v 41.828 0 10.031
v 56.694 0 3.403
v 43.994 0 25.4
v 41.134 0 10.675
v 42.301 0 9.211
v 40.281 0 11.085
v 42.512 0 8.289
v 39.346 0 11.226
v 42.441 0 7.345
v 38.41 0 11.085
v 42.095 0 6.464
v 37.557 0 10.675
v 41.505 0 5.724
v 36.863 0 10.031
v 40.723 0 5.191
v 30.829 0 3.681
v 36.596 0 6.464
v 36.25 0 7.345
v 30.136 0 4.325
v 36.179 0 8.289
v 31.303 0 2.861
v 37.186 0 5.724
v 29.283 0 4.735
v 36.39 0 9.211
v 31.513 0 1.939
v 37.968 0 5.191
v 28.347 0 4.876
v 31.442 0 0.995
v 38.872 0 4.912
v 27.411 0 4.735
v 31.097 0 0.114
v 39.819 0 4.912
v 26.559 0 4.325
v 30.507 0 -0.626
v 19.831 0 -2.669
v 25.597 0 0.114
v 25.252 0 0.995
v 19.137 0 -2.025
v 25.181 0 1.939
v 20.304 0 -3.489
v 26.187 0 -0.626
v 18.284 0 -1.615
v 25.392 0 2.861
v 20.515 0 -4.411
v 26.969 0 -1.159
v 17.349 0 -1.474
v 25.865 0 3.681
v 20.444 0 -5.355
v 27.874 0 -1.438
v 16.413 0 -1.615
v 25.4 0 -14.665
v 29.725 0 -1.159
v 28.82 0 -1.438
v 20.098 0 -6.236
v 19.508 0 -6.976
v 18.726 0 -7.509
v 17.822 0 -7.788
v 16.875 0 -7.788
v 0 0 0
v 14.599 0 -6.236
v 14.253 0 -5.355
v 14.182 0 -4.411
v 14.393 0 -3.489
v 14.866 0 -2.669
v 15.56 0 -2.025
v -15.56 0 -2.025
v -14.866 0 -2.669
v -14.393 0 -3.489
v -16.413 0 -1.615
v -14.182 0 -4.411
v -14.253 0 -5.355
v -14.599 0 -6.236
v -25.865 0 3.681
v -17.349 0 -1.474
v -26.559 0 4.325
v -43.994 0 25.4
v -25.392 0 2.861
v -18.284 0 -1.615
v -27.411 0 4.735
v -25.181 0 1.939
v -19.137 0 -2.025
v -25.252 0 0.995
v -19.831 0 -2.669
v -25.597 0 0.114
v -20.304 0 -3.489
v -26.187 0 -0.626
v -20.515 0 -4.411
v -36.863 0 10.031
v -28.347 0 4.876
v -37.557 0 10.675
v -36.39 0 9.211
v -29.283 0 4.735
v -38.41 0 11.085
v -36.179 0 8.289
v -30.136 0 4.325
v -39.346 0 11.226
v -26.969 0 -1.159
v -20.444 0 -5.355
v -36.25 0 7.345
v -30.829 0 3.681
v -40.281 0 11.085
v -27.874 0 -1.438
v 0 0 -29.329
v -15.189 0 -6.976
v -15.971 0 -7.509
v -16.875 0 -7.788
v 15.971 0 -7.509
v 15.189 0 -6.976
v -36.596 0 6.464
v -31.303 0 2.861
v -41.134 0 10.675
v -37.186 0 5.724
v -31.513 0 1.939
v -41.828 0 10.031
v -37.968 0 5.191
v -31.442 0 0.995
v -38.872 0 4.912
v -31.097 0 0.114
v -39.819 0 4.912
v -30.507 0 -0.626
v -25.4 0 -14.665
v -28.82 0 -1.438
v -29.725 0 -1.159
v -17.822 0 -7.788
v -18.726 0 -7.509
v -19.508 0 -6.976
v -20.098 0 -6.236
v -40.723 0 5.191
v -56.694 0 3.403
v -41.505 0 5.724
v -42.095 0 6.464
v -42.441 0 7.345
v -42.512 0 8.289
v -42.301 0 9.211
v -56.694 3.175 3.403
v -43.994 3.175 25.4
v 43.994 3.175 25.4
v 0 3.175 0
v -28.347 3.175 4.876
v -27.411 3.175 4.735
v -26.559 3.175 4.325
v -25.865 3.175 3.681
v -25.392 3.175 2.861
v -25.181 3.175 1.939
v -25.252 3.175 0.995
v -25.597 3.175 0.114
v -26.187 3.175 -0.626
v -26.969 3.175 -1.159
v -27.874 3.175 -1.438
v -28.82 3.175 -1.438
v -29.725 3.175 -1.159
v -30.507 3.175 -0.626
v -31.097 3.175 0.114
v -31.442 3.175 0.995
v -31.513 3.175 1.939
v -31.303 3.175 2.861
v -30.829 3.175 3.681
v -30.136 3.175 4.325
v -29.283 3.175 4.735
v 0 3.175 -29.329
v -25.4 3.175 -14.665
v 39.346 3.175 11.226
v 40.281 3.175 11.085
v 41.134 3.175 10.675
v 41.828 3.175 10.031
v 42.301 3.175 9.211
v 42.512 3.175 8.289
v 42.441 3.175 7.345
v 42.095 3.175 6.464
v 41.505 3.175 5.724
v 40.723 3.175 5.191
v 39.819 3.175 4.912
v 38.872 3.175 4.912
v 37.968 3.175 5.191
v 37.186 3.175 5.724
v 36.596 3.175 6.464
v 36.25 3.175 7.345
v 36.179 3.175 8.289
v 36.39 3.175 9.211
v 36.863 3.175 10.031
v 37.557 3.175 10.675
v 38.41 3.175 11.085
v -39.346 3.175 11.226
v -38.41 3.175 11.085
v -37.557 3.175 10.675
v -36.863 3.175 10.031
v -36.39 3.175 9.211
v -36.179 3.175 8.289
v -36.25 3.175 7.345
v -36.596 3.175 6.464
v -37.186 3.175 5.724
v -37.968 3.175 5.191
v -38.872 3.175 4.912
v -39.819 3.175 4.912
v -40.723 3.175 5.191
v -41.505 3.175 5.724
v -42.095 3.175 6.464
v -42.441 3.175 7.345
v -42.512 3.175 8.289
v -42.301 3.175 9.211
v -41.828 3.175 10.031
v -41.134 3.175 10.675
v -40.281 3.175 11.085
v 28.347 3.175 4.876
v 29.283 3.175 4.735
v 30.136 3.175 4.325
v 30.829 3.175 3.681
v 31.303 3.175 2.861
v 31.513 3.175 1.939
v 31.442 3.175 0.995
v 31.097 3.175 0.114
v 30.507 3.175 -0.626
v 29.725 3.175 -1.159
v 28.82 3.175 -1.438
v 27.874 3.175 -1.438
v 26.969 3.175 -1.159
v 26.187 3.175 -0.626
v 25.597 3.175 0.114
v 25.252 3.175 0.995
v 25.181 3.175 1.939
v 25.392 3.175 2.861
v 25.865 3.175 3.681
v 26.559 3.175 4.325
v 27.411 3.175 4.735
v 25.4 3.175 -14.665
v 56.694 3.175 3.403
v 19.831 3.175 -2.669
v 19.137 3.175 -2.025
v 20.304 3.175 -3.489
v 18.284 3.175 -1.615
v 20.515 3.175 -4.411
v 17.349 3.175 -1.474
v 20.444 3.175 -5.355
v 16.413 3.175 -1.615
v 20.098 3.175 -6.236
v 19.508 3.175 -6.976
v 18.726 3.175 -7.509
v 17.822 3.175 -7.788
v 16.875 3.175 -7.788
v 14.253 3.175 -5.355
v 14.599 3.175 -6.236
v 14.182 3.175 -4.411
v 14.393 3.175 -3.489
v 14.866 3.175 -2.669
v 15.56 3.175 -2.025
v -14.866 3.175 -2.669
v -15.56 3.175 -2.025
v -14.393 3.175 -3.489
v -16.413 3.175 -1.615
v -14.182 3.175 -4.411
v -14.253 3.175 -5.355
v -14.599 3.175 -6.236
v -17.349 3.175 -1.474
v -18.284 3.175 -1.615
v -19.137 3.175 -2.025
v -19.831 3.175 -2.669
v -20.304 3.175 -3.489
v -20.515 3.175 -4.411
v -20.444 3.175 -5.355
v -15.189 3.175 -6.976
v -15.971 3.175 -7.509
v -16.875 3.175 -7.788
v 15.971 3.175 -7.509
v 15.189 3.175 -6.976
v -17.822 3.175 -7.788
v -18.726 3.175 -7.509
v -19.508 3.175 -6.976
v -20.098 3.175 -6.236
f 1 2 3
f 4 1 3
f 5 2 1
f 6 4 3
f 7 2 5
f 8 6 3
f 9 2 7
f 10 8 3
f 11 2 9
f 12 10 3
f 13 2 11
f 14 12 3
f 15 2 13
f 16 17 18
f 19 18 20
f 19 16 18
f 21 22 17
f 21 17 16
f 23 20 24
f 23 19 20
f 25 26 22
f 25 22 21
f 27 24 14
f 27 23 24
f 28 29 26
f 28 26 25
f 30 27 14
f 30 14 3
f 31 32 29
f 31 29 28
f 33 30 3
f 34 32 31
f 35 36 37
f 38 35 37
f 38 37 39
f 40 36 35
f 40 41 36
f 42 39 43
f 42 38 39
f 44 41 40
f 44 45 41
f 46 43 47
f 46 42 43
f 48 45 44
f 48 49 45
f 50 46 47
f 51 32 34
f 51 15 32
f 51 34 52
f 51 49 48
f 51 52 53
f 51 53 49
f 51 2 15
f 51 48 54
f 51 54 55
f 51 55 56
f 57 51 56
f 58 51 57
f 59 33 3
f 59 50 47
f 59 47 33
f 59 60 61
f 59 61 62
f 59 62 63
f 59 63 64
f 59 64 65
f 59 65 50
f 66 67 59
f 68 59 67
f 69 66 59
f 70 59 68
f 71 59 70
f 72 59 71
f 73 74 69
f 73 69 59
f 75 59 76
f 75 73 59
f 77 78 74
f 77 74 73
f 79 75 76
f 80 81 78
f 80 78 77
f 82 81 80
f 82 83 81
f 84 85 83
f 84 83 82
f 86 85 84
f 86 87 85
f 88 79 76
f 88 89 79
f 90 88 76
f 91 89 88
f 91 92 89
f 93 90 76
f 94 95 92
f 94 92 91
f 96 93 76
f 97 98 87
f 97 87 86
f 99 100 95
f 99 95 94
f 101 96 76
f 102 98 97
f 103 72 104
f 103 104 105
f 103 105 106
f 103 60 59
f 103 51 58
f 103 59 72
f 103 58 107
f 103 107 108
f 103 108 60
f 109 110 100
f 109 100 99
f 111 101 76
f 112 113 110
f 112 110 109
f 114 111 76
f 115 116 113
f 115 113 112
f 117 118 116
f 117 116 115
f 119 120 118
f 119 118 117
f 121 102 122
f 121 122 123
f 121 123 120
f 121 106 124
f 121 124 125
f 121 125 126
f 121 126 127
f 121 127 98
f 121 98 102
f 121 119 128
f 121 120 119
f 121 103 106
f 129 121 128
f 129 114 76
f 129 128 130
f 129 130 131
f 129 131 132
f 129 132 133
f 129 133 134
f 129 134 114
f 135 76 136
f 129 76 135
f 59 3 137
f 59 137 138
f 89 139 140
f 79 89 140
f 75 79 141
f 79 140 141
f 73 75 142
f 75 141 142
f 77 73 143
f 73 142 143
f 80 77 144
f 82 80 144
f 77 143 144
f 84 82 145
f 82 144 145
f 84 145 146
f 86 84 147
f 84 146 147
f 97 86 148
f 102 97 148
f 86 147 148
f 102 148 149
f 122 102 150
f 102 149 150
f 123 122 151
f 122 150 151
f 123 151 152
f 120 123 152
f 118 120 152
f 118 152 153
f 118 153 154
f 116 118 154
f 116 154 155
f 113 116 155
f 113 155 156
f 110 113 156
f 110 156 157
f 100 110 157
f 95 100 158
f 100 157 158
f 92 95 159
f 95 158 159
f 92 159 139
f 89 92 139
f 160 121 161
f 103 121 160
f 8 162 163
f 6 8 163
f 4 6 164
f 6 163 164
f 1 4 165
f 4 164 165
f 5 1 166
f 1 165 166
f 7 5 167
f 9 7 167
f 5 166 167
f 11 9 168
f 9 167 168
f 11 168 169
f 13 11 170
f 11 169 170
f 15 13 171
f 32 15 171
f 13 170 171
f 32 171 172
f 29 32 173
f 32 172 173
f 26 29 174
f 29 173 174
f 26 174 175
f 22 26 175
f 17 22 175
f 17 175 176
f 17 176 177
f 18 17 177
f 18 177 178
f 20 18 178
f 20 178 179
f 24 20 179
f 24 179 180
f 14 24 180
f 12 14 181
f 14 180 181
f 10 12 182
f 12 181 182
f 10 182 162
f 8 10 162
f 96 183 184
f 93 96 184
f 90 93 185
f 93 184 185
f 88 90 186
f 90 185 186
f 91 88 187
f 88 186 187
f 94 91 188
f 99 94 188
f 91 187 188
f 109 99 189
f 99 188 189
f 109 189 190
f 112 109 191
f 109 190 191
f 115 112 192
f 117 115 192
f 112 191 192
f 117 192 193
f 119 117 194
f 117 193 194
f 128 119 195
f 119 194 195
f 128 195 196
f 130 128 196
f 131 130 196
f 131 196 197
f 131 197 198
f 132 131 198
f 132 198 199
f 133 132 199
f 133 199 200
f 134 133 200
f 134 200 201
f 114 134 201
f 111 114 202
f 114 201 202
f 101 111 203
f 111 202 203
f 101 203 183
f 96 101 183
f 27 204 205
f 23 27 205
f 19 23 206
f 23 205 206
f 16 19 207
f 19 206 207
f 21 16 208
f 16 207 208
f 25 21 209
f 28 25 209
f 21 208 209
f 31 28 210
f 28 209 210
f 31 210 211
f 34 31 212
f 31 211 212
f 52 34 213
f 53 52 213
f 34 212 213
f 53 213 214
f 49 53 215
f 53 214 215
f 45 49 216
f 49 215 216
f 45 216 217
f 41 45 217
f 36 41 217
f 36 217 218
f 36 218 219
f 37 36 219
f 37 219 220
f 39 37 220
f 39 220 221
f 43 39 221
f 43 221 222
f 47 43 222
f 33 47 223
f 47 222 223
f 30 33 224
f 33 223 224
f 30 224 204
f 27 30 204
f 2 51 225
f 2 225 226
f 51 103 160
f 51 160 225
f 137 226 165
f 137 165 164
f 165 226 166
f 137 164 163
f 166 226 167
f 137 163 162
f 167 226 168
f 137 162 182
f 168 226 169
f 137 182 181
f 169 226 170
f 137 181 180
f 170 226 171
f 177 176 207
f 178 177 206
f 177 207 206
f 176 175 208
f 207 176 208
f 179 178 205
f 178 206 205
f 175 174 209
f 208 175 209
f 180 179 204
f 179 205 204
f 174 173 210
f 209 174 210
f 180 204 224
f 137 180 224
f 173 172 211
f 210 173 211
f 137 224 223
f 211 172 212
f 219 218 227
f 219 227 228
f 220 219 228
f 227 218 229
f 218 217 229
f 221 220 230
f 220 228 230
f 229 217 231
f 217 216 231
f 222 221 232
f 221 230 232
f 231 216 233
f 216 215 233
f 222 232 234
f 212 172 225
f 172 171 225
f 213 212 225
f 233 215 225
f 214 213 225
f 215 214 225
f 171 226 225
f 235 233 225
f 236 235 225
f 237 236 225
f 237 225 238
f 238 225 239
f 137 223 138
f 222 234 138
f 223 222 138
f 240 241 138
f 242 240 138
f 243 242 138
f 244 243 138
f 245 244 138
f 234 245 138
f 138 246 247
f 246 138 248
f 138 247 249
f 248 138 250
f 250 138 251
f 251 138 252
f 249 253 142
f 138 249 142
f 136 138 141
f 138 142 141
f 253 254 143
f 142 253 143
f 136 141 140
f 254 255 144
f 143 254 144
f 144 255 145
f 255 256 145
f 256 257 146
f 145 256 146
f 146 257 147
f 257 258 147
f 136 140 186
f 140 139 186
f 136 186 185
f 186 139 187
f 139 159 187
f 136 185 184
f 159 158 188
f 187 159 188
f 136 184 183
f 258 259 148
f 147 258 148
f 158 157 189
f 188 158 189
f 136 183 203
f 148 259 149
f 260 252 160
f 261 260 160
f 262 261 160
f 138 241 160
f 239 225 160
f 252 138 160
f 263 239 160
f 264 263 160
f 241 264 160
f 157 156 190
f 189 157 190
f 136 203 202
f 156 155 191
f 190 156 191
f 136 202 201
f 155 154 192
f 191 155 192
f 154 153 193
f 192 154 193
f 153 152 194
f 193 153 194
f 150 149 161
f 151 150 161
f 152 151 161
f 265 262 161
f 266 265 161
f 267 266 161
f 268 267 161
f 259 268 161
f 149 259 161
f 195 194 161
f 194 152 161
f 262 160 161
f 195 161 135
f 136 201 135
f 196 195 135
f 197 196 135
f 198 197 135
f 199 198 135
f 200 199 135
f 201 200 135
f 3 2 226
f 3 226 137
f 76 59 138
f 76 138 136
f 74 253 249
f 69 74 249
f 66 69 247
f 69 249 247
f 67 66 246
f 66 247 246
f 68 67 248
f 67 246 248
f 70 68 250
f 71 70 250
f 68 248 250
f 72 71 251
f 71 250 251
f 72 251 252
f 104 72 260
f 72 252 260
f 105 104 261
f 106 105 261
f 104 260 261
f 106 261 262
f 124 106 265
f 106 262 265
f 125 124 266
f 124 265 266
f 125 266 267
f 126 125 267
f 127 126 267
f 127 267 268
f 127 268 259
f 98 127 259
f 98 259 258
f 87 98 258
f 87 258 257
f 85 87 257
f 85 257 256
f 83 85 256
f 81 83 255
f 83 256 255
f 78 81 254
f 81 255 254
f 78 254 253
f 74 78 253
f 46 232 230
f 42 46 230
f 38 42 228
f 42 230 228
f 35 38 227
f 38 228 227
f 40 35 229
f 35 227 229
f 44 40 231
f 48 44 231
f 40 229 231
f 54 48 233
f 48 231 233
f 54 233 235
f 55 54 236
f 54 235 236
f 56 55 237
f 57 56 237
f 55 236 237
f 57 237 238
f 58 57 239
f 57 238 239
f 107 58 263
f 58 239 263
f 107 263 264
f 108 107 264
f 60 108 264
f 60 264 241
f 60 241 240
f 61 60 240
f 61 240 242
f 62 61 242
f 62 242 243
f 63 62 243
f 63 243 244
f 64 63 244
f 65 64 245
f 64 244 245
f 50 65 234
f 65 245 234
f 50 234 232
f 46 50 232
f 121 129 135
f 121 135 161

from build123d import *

# Parameters (mm, degrees)
BOSS_EXTRUDE1_DEPTH = 3.175
SKETCH2_R           = 3.175
CUT_EXTRUDE2_DEPTH  = 3.175
LPATTERN5_COUNT     = 3
LPATTERN5_PITCH     = 12.7
SKETCH7_R           = 3.175
CUT_EXTRUDE3_DEPTH  = 3.175
LPATTERN6_COUNT     = 3
LPATTERN6_PITCH     = 12.7


with BuildPart() as part:
    # Sketch1 → Boss-Extrude1 (new body)
    with BuildSketch(Plane(origin=(0, 0, 0), x_dir=(1, 0, 0), z_dir=(0, 1, 0))):
        Polygon((-25.4, 14.664696837), (0, 29.329393675), (25.4, 14.664696837), (56.694090512, -3.402954744), (43.994090512, -25.4), (0, 0), (-43.994090512, -25.4), (-56.694090512, -3.402954744), align=None)
    extrude(amount=BOSS_EXTRUDE1_DEPTH)

    # Sketch2 → Cut-Extrude2 (cut)
    with BuildSketch(Plane(origin=(0, 3.175, 0), x_dir=(1, 0, 0), z_dir=(0, 1, 0))):
        with Locations(Location((-39.345567884, -8.051477372, 0), (0, 0, 270))):
            Circle(SKETCH2_R)
    cut_extrude2 = extrude(amount=-CUT_EXTRUDE2_DEPTH, mode=Mode.SUBTRACT)

    # LPattern5: Cut-Extrude2 ×3
    with Locations(*[Vector(0.866025403784438, 0, -0.5000000000000012) * (i * LPATTERN5_PITCH) for i in range(1, LPATTERN5_COUNT)]):
        add(cut_extrude2, mode=Mode.SUBTRACT)

    # Sketch7 → Cut-Extrude3 (cut)
    with BuildSketch(Plane(origin=(0, 3.175, 0), x_dir=(1, 0, 0), z_dir=(0, 1, 0))):
        with Locations(Location((39.345567884, -8.051477372, 0), (0, 0, 270))):
            Circle(SKETCH7_R)
    cut_extrude3 = extrude(amount=-CUT_EXTRUDE3_DEPTH, mode=Mode.SUBTRACT)

    # LPattern6: Cut-Extrude3 ×3
    with Locations(*[Vector(-0.8660254037844382, 0, -0.500000000000001) * (i * LPATTERN6_PITCH) for i in range(1, LPATTERN6_COUNT)]):
        add(cut_extrude3, mode=Mode.SUBTRACT)


solid = part.part
